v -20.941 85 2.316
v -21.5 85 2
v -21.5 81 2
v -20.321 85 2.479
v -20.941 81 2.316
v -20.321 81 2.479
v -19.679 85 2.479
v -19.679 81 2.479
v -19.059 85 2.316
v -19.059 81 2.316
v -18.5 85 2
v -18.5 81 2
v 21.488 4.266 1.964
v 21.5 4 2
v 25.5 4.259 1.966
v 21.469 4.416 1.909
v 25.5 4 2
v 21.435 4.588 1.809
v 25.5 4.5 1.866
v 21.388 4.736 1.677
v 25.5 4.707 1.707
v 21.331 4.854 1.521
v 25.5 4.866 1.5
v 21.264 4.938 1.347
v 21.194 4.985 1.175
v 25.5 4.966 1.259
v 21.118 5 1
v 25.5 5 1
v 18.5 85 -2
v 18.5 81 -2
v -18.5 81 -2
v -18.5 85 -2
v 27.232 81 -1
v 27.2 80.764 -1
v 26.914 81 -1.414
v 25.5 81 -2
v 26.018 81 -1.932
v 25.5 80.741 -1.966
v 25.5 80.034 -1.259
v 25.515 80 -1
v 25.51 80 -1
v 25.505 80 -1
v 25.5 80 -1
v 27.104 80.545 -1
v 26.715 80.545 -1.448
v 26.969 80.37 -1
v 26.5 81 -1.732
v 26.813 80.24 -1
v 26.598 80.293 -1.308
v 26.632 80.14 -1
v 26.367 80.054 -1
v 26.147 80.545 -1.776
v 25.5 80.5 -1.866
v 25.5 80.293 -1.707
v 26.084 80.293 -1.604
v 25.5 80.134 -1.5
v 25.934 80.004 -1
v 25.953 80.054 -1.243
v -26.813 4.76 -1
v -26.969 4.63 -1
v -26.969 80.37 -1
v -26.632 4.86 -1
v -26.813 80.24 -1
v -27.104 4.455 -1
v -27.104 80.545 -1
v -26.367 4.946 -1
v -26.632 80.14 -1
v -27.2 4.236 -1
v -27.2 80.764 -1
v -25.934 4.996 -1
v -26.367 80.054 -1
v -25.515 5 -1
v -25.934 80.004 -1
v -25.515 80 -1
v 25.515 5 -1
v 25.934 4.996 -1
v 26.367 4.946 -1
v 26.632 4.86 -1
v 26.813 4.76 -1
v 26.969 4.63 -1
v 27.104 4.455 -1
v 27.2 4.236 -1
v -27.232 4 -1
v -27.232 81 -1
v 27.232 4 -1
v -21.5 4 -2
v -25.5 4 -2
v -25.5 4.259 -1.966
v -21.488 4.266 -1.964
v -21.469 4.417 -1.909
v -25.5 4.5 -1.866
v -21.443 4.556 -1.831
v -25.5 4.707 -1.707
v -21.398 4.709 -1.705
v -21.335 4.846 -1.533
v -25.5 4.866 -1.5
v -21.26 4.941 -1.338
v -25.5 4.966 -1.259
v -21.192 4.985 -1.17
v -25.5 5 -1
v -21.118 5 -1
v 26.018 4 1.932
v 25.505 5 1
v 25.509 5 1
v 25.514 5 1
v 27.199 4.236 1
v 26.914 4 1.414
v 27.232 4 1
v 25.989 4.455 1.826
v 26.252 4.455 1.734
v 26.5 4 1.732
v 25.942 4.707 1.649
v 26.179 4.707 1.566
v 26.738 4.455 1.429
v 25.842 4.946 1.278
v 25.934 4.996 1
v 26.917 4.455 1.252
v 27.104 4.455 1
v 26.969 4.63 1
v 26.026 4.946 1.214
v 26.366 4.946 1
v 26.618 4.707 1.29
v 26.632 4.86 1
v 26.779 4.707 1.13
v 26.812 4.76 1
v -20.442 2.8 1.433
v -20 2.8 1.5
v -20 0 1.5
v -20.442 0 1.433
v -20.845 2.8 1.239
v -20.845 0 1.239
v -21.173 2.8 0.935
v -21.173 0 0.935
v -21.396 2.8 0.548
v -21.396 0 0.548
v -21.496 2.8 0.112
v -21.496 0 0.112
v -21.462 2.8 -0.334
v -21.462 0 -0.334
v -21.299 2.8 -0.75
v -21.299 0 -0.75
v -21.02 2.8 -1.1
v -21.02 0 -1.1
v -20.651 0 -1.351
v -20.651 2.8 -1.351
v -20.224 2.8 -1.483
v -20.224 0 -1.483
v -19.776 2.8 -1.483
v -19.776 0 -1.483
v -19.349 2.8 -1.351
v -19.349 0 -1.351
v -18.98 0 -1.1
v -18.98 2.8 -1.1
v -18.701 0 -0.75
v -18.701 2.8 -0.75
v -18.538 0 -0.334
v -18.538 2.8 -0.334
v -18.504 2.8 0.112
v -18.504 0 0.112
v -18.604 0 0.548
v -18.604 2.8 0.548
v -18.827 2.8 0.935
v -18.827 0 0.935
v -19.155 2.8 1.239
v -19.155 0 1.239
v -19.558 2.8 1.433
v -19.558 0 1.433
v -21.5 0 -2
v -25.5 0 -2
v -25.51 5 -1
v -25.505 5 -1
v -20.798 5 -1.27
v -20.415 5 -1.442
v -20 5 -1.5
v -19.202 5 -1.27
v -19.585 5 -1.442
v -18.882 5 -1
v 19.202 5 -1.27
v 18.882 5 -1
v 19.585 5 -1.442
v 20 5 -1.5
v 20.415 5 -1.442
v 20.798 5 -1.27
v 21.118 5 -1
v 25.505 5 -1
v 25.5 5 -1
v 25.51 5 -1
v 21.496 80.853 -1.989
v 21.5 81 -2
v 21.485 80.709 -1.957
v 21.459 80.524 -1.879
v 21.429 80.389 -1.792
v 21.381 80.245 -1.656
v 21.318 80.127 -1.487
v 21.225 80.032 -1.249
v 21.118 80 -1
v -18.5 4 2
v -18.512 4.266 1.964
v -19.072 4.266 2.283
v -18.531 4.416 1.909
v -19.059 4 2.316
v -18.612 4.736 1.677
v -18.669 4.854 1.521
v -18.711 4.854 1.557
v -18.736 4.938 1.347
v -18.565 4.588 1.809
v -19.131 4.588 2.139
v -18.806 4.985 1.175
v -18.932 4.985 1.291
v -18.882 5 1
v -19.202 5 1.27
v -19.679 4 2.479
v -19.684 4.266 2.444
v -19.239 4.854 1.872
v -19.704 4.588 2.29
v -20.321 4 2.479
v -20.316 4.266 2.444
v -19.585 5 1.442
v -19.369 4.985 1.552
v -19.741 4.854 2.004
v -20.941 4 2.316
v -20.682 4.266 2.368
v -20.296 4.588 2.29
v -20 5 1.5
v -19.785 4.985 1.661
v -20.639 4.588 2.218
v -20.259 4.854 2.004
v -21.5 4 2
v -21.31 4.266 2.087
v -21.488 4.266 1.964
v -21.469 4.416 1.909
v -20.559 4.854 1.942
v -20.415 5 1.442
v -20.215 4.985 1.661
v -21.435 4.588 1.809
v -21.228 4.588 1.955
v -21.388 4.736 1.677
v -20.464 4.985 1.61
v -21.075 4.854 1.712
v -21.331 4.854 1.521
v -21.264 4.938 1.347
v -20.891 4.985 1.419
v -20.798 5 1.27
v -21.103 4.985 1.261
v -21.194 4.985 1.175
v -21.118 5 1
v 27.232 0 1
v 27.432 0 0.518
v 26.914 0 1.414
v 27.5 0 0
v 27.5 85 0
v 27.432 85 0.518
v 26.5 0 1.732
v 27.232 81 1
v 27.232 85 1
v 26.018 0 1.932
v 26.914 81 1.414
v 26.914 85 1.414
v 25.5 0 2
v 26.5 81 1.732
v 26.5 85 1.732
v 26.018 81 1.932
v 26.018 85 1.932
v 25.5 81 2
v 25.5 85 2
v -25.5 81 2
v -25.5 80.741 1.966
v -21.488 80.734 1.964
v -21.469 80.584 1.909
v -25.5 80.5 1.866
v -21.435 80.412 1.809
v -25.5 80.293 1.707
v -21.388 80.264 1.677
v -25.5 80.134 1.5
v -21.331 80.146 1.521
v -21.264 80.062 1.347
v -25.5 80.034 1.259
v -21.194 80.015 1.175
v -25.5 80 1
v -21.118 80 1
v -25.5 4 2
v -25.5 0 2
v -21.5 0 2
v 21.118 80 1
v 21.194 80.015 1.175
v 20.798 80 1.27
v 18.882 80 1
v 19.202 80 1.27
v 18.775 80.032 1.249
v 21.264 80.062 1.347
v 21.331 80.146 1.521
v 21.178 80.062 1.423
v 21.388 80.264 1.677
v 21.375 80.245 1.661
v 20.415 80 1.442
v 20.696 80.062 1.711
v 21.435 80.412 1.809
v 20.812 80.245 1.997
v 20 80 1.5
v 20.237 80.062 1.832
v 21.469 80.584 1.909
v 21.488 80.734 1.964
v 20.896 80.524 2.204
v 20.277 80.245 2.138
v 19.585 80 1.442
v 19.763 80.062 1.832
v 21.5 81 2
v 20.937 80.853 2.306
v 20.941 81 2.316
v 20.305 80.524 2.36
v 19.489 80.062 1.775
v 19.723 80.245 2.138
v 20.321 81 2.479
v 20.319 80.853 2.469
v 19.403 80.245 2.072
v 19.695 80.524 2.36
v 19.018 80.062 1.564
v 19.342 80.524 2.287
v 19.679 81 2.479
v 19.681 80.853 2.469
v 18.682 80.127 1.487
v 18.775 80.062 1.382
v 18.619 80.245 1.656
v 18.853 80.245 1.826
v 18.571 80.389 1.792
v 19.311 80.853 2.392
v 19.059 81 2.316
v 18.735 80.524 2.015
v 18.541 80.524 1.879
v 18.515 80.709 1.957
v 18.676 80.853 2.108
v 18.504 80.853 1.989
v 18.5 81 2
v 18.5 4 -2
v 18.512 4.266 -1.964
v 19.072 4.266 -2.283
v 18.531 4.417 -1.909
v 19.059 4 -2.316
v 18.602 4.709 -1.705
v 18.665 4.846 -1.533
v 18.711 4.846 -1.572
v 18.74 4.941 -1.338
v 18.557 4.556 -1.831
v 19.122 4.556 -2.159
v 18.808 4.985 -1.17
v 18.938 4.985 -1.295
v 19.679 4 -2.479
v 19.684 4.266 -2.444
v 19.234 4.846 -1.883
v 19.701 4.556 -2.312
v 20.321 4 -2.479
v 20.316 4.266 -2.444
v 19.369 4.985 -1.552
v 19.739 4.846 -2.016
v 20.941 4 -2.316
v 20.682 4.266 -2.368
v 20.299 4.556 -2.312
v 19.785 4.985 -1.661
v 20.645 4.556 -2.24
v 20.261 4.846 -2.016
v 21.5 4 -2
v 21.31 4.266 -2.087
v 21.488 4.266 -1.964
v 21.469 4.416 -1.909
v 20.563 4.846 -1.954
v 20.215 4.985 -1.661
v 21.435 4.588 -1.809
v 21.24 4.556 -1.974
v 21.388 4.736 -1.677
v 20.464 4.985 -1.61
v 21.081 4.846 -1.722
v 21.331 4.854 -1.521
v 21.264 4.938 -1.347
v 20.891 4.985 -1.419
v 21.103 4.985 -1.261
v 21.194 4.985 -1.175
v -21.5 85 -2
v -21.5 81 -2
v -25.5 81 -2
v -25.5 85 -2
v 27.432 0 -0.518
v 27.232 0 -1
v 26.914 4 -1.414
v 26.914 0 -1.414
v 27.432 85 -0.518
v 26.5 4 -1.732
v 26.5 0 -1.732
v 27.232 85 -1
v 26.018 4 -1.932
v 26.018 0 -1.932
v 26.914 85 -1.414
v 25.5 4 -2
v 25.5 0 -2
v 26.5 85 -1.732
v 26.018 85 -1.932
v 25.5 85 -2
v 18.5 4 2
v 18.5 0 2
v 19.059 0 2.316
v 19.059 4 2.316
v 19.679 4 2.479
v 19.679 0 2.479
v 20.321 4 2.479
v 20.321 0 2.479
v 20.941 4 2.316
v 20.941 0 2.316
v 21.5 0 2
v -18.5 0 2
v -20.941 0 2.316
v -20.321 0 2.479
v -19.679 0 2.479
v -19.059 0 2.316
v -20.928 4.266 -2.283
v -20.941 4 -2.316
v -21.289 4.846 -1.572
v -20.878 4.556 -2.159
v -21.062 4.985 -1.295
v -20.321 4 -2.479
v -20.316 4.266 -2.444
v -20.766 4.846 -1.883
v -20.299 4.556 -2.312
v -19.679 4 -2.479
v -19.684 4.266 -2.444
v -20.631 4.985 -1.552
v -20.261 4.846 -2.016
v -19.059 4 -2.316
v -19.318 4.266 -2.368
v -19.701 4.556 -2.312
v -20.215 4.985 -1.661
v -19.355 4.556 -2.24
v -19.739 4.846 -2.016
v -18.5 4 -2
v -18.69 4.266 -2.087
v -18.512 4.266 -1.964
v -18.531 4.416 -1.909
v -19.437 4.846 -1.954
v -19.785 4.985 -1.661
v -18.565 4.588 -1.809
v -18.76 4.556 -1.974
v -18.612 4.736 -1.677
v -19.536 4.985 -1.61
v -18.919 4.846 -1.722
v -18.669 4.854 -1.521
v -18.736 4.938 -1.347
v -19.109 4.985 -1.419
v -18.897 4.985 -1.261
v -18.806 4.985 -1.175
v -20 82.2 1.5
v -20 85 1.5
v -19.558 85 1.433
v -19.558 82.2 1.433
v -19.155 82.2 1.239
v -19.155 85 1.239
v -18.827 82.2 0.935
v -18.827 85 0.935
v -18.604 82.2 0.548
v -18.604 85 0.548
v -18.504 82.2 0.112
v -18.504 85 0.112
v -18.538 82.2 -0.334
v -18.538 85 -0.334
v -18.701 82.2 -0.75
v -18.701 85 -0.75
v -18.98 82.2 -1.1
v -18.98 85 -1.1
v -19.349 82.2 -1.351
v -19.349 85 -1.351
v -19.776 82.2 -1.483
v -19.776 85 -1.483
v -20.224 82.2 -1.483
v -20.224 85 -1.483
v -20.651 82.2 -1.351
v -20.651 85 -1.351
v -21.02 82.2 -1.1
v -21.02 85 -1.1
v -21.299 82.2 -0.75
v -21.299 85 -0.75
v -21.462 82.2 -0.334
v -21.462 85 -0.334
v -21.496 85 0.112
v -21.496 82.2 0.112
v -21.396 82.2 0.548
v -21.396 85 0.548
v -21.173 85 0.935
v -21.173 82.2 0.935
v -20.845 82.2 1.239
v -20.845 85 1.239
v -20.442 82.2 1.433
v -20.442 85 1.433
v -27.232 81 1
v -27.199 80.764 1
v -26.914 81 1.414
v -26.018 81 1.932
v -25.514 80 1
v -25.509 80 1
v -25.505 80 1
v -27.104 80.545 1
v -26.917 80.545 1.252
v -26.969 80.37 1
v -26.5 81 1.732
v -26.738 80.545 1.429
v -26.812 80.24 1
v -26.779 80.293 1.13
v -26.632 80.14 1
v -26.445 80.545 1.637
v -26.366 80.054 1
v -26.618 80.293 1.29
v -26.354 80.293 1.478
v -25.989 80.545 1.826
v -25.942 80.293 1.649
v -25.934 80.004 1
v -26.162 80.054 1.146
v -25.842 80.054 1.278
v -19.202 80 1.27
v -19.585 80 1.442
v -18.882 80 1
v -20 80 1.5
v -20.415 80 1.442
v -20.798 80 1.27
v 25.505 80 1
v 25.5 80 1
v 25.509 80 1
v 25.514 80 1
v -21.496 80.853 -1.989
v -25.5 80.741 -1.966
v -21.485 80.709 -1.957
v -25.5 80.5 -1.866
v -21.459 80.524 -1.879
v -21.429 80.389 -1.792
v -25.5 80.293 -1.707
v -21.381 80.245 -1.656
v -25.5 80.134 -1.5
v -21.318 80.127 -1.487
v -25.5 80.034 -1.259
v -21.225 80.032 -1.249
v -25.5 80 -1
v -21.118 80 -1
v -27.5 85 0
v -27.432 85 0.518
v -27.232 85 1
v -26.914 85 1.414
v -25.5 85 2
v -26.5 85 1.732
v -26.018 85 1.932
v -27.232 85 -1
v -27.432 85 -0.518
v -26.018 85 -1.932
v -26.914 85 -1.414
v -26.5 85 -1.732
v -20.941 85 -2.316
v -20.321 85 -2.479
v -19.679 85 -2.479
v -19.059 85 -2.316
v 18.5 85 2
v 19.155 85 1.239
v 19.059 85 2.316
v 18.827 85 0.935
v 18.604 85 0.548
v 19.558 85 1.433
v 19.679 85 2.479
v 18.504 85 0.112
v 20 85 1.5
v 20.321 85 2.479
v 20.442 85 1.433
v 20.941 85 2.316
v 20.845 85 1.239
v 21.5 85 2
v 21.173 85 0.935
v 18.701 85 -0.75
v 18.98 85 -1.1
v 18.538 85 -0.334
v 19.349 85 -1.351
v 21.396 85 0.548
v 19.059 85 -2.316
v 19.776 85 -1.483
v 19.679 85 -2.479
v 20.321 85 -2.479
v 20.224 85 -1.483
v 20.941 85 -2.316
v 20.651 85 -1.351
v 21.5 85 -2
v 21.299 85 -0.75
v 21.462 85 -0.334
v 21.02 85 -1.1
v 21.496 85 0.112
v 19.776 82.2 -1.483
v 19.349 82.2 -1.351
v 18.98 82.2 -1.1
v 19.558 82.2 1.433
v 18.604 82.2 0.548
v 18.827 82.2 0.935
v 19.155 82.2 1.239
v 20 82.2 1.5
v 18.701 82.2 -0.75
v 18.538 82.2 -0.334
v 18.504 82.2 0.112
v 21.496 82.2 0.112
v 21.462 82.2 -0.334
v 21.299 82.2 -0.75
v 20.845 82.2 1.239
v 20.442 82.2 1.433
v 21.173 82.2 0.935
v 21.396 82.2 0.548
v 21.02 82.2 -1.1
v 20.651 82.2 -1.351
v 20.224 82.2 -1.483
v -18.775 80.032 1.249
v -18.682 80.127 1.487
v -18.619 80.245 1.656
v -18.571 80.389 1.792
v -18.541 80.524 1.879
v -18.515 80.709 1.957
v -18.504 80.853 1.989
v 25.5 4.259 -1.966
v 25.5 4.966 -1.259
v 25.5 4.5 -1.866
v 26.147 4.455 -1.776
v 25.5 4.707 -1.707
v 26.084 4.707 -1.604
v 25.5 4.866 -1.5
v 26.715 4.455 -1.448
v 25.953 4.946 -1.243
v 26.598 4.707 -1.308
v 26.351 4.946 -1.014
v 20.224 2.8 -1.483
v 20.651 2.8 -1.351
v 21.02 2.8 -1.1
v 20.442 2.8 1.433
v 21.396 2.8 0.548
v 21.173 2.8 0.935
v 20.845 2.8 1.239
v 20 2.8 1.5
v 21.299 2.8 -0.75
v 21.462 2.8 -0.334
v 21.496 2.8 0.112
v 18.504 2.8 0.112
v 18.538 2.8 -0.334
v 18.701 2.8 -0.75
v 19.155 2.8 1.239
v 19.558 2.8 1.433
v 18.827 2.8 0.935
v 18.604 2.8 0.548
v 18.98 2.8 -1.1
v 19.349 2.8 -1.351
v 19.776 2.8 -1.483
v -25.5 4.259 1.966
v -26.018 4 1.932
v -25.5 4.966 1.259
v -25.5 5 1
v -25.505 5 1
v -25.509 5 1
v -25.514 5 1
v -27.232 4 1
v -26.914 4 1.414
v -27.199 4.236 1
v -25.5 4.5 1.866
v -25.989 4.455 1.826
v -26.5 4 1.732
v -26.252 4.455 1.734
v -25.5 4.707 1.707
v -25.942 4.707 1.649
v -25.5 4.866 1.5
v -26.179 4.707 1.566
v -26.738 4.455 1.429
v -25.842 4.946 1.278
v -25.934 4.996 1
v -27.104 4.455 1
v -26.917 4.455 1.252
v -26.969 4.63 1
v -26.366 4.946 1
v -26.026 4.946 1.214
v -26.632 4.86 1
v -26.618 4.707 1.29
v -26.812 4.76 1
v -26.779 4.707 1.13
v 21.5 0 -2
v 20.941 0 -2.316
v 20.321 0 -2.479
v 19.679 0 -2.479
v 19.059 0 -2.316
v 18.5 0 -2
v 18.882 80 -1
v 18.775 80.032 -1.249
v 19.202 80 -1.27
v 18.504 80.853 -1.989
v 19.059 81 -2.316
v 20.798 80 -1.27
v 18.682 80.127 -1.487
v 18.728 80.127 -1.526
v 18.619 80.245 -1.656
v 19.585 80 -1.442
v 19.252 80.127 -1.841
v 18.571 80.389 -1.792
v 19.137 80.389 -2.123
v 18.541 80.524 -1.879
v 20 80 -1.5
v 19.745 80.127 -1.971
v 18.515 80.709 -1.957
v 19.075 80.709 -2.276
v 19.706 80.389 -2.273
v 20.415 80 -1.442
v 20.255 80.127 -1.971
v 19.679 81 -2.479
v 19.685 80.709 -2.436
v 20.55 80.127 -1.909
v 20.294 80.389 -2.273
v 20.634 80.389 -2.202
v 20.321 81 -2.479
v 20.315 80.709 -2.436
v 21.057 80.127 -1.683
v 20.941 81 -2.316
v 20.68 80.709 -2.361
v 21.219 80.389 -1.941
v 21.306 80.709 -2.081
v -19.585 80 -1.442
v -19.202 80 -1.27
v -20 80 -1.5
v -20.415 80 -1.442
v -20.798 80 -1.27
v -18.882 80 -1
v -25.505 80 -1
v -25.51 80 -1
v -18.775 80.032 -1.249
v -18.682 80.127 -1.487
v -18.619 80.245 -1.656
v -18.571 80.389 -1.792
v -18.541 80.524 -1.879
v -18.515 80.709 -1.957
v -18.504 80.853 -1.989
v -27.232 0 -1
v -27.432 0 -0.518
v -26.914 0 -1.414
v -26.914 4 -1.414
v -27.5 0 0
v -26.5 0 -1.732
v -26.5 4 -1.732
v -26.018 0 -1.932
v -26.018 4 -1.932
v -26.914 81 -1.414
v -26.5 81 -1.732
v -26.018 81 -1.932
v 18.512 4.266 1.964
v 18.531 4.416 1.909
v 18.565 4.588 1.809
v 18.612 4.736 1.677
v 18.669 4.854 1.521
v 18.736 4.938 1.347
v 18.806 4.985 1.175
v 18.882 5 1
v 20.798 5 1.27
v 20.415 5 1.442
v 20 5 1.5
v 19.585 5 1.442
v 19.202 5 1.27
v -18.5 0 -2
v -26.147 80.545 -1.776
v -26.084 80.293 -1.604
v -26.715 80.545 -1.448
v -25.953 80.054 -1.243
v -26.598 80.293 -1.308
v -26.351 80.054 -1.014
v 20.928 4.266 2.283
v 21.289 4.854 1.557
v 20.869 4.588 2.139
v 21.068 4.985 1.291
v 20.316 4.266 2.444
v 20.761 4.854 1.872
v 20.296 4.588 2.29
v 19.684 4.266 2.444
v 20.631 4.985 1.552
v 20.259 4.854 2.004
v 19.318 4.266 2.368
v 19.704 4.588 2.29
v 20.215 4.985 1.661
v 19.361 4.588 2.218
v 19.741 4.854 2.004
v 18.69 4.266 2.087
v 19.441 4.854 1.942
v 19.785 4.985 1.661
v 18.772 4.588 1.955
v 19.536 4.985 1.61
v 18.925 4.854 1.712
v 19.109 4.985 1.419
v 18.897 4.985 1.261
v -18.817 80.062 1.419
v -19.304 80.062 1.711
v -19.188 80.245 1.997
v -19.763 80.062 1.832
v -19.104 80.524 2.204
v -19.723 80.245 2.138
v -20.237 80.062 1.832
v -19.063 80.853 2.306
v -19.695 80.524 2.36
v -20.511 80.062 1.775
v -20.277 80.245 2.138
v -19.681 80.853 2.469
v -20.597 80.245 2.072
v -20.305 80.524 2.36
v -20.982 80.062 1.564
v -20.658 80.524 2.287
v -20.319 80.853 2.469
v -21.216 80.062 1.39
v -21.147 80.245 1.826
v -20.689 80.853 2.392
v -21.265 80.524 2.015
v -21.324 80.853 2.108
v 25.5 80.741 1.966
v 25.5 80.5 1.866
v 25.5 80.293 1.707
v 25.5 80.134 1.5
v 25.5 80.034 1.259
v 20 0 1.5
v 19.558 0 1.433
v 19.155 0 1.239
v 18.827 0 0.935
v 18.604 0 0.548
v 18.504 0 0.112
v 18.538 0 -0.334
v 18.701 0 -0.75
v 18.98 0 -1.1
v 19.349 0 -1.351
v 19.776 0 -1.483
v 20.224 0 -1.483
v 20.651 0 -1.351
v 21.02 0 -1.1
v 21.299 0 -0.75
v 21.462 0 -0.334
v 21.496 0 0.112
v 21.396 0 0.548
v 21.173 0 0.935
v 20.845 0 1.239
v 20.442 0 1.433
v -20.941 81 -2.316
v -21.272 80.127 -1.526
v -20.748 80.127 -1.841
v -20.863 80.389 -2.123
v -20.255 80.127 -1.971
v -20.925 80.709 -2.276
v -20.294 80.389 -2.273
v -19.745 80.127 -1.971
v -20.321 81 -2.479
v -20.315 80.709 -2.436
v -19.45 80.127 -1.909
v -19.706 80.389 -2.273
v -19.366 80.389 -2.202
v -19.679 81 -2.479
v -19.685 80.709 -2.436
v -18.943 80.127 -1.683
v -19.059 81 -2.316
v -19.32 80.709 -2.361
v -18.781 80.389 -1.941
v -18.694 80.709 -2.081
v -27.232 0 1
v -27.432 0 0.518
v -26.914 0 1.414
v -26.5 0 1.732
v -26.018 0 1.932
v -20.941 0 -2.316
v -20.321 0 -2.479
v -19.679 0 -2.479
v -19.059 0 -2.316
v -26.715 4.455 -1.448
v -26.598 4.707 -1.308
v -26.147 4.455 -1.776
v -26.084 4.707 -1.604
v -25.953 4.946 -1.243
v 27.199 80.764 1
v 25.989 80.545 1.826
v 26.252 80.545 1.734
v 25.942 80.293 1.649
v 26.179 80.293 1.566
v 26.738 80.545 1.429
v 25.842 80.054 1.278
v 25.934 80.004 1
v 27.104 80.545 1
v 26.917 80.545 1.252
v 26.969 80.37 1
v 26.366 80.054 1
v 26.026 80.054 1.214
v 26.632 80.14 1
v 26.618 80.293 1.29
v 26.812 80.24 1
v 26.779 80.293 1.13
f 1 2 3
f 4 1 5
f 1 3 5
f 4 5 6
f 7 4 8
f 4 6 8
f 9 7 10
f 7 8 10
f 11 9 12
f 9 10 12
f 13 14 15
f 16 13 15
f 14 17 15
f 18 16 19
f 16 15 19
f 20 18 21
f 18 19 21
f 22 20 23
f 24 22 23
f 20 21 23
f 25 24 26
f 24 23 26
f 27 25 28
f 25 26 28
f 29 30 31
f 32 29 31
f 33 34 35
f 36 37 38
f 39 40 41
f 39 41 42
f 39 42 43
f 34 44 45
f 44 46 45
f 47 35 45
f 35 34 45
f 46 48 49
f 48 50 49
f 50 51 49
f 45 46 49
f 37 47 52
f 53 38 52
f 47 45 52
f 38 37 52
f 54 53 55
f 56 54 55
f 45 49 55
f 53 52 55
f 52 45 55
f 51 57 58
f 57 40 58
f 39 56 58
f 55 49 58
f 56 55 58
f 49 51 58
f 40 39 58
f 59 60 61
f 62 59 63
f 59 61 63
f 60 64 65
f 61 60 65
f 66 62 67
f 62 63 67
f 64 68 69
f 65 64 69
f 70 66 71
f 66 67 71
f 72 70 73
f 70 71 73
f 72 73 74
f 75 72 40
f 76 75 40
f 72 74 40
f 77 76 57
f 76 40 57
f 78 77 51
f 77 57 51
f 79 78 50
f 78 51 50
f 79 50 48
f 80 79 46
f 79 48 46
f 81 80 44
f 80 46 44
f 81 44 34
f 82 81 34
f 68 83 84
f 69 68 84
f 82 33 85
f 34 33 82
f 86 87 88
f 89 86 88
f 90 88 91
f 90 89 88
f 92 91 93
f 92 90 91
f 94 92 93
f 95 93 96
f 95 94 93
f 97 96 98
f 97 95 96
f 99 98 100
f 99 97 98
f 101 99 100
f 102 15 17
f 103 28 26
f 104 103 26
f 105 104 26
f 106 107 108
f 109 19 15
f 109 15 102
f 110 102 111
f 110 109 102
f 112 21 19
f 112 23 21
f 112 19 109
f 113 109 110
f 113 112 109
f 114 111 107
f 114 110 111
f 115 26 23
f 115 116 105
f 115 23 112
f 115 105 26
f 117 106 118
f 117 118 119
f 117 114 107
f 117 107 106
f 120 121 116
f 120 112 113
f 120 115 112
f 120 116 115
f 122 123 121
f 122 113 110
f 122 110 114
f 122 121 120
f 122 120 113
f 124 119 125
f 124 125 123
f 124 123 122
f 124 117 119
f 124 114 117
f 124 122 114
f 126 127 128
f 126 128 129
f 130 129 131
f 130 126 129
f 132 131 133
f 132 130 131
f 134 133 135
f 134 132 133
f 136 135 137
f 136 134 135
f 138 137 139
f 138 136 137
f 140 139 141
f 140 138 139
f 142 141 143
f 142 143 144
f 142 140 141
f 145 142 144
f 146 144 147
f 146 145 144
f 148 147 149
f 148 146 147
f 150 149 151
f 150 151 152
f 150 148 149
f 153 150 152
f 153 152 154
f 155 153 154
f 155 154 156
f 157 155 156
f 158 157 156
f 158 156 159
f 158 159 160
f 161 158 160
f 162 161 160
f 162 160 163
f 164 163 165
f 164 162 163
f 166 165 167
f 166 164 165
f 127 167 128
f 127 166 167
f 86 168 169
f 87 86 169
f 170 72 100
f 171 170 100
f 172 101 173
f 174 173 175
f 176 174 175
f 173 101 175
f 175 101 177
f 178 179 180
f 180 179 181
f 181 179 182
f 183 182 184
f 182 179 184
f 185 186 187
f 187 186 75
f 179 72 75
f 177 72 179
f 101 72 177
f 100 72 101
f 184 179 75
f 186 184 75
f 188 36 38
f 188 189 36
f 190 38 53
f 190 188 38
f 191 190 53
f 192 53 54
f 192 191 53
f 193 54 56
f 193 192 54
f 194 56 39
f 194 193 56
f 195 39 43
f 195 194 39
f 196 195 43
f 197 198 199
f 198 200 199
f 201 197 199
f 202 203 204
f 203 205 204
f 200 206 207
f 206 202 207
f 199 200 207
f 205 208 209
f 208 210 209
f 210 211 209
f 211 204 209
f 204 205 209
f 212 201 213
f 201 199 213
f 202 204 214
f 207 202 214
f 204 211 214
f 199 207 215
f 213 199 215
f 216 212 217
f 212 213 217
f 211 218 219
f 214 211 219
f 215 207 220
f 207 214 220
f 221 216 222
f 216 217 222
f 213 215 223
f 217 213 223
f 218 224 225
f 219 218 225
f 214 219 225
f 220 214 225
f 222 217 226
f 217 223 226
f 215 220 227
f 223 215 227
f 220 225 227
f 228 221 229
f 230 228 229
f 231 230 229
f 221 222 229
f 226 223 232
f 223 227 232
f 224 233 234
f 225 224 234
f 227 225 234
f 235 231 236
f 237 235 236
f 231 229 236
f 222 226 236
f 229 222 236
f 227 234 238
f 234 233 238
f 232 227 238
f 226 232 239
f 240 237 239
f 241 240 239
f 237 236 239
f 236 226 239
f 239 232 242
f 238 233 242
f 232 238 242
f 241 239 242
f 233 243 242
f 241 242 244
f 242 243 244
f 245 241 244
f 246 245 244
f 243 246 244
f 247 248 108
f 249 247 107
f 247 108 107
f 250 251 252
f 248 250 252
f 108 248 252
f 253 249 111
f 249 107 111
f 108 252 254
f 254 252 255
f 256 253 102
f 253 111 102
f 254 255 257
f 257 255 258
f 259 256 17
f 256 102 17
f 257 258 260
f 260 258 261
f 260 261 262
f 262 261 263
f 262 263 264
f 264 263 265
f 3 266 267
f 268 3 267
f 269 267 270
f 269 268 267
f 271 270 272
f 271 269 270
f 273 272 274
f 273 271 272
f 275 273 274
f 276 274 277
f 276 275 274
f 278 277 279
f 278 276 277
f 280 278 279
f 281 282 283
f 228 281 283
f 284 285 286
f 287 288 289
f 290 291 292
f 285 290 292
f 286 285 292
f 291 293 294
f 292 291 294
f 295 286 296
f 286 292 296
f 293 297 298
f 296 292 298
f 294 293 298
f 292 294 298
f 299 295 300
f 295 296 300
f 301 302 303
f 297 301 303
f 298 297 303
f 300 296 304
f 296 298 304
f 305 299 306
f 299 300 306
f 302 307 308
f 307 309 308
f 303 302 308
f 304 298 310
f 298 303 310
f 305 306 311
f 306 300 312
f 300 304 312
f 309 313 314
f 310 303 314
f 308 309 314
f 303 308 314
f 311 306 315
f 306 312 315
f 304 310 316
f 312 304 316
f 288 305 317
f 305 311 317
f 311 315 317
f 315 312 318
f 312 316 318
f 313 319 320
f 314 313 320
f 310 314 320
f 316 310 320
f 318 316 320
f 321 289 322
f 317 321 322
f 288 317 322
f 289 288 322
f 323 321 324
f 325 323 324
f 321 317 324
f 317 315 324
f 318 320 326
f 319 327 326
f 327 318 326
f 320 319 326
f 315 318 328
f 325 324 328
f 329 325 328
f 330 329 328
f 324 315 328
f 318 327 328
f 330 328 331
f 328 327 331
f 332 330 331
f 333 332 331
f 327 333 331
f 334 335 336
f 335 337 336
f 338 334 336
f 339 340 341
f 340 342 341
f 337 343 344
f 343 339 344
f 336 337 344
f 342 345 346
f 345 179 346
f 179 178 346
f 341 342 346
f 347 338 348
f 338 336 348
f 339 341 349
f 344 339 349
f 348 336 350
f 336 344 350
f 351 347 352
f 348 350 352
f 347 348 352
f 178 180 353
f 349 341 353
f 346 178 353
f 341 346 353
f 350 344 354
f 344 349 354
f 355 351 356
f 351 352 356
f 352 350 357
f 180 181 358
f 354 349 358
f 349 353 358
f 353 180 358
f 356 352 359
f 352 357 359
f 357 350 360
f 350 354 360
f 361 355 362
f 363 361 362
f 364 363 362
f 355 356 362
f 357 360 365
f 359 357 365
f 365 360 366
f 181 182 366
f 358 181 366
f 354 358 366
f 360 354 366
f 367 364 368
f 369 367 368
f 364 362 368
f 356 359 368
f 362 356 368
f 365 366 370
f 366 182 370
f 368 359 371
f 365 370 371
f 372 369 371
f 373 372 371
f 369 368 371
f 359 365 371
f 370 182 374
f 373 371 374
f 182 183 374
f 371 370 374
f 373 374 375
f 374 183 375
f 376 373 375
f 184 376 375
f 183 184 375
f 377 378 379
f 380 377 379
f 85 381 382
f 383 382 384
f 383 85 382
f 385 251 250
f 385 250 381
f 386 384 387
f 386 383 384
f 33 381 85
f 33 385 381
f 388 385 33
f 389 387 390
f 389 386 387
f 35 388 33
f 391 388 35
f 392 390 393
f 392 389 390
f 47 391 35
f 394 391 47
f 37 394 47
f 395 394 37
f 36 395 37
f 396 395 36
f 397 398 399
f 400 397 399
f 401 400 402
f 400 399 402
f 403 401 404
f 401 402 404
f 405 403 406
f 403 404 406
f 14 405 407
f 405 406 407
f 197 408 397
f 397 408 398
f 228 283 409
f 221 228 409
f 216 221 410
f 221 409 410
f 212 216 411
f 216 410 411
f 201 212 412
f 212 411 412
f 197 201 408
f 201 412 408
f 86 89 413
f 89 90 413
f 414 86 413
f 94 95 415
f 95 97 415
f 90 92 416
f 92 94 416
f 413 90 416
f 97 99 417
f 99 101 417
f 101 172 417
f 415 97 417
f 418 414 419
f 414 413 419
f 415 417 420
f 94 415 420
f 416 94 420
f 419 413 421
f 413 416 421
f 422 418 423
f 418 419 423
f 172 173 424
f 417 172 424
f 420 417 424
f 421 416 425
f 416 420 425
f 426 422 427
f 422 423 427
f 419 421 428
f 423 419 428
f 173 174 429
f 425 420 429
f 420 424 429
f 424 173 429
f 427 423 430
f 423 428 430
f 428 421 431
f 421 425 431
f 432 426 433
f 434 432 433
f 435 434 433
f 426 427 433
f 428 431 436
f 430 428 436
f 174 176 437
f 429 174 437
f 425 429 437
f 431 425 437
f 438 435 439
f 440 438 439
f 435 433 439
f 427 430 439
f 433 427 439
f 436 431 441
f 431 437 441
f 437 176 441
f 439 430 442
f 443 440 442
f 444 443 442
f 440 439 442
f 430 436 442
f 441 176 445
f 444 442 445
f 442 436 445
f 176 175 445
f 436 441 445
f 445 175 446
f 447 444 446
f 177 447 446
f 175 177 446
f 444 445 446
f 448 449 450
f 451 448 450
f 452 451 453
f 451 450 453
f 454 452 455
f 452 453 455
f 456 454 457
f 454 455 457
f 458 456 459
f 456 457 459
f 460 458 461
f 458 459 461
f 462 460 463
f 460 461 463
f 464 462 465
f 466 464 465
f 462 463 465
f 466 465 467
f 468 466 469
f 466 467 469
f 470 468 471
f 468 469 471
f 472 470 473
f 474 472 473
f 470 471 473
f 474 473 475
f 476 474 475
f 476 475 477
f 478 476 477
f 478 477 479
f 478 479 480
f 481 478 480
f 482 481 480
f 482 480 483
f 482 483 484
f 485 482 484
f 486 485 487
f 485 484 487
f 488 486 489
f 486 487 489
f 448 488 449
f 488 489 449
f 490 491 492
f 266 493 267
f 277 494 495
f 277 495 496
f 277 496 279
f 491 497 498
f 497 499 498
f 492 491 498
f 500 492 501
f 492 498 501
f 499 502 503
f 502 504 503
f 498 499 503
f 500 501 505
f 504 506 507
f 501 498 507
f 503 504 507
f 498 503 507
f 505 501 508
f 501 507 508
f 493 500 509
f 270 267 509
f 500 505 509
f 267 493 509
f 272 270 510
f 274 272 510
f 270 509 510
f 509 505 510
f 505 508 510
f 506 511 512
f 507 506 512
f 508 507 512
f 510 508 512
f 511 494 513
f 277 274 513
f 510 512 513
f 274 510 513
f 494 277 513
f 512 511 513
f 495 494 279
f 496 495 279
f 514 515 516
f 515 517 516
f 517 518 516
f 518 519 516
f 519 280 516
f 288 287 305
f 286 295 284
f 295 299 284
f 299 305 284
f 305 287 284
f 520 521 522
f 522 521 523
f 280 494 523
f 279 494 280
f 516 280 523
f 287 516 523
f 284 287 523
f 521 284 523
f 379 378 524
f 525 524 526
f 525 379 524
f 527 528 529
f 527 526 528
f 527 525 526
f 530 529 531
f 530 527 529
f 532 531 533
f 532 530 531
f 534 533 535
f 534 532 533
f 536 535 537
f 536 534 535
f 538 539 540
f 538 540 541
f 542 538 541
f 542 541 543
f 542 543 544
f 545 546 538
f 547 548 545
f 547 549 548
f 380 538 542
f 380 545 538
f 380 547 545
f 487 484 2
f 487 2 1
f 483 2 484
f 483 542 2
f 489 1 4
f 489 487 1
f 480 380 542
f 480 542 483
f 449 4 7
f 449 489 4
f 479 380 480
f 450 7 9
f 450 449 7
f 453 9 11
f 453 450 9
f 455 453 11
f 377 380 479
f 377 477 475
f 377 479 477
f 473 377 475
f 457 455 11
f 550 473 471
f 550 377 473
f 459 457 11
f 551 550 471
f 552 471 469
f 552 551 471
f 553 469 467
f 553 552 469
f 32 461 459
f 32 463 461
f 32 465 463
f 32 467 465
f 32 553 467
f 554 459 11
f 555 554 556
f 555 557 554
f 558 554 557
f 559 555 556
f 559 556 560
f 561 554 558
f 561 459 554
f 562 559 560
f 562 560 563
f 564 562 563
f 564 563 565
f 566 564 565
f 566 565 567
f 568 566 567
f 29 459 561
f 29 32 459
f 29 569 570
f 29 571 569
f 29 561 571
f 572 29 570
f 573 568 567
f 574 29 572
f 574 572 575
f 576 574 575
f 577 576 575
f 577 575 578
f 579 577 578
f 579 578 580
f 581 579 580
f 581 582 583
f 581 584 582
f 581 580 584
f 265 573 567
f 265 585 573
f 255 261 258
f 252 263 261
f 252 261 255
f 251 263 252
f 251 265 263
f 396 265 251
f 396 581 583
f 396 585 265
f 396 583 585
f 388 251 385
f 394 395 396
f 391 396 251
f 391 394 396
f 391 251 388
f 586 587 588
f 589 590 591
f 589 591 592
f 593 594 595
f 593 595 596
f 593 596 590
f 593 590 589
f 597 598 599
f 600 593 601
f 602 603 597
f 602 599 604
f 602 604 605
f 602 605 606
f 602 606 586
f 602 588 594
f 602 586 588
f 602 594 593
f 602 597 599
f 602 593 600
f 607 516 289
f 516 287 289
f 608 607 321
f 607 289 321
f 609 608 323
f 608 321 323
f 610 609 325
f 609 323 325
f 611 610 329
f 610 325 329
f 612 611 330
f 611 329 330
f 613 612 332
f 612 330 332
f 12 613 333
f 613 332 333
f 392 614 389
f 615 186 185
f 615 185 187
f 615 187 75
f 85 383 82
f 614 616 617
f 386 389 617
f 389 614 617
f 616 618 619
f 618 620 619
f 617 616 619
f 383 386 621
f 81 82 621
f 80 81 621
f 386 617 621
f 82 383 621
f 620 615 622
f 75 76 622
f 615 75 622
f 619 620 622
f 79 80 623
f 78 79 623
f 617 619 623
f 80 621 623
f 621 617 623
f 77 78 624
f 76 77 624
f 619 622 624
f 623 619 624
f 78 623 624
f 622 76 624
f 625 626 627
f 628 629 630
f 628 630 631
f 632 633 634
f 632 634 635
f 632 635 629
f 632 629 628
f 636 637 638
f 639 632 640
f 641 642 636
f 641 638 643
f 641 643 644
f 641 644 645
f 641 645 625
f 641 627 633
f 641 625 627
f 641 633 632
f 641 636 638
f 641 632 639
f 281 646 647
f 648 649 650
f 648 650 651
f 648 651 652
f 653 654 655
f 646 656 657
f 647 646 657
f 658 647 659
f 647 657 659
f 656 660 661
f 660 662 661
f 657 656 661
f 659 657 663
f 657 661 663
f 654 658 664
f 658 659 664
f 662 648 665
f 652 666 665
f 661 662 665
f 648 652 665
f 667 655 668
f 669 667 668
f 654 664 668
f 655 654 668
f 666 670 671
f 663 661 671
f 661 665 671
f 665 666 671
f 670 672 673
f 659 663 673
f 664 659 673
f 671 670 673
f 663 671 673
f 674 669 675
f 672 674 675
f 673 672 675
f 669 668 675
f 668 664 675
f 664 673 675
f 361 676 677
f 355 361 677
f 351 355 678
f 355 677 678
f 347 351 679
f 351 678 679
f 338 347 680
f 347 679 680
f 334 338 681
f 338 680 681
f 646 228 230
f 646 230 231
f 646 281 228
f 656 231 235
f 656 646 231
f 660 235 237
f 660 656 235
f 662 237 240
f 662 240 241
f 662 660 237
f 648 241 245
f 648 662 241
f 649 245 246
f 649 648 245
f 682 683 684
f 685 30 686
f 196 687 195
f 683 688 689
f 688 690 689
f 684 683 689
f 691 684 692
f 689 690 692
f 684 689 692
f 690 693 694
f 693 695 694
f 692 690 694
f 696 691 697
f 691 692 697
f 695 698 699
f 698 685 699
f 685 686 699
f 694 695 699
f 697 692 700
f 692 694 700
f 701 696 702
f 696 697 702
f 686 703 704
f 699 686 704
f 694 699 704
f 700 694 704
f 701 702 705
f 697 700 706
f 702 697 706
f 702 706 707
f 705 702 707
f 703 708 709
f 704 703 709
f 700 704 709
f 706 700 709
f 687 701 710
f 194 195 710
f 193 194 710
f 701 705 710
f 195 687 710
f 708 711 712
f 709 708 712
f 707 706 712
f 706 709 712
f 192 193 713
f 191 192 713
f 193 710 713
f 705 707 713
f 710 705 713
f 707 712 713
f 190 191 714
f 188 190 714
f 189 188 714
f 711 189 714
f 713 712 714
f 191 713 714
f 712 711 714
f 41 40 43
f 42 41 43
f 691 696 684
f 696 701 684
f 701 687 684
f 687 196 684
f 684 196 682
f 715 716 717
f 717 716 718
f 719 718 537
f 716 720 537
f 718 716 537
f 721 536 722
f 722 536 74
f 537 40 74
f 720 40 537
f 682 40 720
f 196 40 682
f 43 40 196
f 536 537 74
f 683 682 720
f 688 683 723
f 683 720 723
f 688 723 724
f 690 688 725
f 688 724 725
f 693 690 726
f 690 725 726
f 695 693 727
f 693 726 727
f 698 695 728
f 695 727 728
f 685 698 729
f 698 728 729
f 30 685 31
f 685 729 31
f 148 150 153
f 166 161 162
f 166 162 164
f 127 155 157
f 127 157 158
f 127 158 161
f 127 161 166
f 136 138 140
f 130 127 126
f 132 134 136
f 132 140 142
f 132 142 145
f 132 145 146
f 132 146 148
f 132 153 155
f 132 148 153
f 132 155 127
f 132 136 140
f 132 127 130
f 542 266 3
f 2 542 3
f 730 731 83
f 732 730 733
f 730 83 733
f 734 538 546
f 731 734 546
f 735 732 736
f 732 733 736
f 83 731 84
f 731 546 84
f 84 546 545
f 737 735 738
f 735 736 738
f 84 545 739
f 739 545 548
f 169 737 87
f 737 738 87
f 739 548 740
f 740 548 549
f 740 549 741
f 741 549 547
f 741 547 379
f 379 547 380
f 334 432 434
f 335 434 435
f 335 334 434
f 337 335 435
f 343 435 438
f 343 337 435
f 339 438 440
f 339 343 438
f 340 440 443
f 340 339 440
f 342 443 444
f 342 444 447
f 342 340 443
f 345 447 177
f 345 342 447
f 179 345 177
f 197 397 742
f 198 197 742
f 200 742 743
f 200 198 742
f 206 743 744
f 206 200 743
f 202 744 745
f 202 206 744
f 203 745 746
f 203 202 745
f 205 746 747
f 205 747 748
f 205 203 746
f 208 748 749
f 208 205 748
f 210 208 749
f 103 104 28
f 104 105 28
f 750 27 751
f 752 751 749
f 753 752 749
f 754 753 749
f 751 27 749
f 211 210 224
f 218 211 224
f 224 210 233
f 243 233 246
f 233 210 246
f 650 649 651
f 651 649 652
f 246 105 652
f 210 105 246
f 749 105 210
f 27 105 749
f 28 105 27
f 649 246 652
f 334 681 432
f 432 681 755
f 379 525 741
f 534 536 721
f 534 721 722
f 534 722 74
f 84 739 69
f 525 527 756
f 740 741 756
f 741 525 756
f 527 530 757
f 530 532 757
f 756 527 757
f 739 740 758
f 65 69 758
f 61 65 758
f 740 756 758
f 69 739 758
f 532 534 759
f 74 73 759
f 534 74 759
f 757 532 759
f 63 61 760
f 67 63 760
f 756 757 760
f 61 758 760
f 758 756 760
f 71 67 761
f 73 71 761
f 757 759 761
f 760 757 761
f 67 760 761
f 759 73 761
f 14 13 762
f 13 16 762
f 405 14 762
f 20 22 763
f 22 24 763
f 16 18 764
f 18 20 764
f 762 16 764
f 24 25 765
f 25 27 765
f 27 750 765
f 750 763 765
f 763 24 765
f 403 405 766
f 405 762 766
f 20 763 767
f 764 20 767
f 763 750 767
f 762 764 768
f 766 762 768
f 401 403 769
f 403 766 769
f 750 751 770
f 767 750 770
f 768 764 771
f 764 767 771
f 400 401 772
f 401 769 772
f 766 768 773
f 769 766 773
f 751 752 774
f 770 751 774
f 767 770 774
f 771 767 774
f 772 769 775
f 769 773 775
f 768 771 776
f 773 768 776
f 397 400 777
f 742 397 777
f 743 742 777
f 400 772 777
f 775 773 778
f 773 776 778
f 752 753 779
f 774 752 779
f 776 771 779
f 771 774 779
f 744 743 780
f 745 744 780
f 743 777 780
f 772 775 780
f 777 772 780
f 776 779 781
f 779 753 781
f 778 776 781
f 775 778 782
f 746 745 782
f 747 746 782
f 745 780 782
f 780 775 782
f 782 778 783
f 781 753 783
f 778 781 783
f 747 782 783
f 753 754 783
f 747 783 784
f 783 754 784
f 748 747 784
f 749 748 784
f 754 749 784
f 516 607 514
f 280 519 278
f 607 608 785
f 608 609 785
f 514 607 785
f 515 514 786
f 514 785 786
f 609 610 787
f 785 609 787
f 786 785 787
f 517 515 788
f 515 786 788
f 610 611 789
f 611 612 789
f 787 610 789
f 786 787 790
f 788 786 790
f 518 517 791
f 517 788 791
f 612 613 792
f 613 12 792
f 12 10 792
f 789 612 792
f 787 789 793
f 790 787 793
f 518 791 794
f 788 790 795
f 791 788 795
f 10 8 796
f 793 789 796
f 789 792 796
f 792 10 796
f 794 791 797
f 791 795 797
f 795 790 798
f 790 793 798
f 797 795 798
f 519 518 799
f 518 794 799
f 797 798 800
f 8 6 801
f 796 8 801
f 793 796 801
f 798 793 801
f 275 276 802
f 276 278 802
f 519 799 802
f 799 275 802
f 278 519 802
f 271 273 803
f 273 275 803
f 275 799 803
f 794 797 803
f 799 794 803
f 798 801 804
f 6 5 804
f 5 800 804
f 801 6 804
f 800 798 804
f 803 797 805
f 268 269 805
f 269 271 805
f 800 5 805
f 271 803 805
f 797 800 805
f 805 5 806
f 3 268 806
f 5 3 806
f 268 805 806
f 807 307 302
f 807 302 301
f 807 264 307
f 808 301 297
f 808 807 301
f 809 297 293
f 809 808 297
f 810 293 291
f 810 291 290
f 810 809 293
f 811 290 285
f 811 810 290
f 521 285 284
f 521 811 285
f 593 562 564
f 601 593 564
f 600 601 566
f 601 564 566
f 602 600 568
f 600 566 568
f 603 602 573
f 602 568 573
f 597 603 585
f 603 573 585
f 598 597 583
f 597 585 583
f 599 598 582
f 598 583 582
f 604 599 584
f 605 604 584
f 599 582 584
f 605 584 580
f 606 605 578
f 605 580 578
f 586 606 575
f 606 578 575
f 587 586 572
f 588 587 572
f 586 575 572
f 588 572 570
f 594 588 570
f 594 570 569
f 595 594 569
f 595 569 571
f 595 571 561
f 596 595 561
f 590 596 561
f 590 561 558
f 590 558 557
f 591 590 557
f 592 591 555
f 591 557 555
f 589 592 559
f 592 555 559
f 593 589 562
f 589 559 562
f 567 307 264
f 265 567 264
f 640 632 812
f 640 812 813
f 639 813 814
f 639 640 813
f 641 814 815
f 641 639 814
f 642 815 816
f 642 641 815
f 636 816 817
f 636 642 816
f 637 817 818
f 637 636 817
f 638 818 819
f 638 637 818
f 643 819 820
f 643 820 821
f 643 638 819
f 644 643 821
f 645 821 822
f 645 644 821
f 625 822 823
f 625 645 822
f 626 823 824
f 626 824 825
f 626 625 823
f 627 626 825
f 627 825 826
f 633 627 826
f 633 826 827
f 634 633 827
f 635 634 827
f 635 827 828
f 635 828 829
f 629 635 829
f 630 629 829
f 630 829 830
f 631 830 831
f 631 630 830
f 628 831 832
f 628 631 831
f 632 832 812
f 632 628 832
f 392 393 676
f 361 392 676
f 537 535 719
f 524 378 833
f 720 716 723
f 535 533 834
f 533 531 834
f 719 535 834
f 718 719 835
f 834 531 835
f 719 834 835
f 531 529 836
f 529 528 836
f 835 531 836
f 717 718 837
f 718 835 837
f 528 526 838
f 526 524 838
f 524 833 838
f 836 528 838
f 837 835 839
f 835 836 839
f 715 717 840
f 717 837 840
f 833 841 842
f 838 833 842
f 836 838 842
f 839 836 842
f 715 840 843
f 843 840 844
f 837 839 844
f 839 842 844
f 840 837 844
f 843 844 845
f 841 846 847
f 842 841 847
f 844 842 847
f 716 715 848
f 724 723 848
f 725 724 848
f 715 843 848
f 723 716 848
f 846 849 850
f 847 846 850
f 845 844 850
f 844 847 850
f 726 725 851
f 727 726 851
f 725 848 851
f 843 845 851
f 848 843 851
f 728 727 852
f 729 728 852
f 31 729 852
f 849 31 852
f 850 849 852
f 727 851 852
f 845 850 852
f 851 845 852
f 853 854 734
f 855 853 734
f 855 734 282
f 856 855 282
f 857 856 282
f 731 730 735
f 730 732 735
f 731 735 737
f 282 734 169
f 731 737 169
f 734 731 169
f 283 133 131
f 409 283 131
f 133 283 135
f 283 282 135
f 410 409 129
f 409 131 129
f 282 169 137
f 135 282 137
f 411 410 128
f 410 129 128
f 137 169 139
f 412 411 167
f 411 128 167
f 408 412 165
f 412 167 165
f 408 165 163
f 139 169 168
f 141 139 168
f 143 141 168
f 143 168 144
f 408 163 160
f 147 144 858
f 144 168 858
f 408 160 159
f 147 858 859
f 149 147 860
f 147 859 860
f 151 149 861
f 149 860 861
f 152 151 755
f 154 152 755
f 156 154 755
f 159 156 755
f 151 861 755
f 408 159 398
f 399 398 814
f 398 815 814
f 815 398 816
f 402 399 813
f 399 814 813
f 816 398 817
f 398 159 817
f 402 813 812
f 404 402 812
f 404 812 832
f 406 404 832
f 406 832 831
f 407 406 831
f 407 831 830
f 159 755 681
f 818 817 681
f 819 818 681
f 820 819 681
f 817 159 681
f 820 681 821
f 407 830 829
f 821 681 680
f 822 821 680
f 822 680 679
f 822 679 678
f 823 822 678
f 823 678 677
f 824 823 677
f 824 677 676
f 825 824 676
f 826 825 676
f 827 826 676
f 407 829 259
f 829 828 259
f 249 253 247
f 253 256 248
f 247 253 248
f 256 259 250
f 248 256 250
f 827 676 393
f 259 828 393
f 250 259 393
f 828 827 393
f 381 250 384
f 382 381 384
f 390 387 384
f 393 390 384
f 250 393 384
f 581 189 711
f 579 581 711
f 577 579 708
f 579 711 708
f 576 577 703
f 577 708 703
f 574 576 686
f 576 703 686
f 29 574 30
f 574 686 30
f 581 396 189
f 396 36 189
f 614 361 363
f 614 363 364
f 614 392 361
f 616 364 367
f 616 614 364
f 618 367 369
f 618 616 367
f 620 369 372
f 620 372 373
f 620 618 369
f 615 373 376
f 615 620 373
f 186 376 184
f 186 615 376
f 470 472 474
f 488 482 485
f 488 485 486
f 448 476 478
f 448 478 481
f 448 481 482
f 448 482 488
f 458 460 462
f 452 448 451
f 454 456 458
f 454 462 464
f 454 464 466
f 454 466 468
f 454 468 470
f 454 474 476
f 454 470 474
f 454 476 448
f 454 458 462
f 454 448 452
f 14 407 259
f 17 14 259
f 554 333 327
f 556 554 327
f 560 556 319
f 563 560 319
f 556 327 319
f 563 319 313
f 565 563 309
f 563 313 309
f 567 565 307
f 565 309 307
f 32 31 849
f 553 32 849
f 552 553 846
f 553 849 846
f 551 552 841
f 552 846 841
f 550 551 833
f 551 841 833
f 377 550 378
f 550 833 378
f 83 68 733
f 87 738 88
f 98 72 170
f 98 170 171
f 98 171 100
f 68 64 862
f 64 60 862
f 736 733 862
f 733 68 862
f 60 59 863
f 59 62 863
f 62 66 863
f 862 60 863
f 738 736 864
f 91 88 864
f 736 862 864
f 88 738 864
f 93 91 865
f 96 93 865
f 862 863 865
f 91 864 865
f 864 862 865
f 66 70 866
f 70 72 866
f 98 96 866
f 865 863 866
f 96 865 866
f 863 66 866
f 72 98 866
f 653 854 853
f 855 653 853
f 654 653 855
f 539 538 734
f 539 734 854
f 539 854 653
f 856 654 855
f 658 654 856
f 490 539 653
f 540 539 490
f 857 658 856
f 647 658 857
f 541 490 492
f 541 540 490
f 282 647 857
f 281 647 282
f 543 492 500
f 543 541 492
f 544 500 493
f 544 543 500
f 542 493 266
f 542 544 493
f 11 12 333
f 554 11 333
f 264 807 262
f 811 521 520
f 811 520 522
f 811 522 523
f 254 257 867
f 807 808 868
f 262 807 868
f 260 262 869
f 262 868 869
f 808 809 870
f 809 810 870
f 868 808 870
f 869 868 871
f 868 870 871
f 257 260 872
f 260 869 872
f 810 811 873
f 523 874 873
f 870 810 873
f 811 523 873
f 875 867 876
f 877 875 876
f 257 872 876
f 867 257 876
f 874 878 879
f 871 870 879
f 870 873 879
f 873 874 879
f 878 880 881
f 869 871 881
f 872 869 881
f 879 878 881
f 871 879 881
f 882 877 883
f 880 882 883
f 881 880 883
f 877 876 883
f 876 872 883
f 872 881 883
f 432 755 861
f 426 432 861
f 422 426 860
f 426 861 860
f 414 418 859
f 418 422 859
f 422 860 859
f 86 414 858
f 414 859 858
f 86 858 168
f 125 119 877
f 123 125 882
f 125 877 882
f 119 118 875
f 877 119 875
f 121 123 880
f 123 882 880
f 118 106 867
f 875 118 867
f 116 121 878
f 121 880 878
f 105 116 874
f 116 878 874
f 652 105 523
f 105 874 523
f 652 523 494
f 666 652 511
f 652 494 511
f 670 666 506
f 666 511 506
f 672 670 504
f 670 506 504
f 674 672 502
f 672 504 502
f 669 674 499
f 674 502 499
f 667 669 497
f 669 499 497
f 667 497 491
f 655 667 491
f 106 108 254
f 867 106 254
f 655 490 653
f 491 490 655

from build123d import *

# Parameters (mm, degrees)
BOSS_EXTRUDE1_DEPTH     = 85
SKETCH2_R               = 1.5000000000000007
CUT_EXTRUDE1_DEPTH      = 2.8
CUT_EXTRUDE2_START      = -2.8
SKETCH3_R               = 1.5000000000000007
CUT_EXTRUDE2_DEPTH      = 2.8
CUT_EXTRUDE3_DEPTH      = 5
CUT_EXTRUDE3_DEPTH_BACK = 1
CUT_EXTRUDE4_DEPTH      = 1
CUT_EXTRUDE4_DEPTH_BACK = 1
FILLET1_R               = 2
FILLET2_R               = 1


with BuildPart() as part:
    # Sketch1 → Boss-Extrude1 (new body)
    with BuildSketch(Plane(origin=(0, 0, 0), x_dir=(1, 0, 0), z_dir=(0, 1, 0))):
        with BuildLine():
            Line((-18.500000000000032, 1.9999999999999996), (-21.500000000000068, 1.9999999999999996))
            ThreePointArc((-21.500000000000053, 1.9999999999999463), (-22.499999999999986, -1.91e-15), (-21.50000000000005, -1.9999999999999476))
            Line((-21.500000000000064, -2.0000000000000004), (-18.500000000000036, -2.0000000000000004))
            ThreePointArc((-18.50000000000003, -2.0000000000000226), (-17.763932022500214, -1.1180339887499129), (-17.499999999999993, -6.1e-16))
            ThreePointArc((-17.499999999999993, 0), (-17.763932022500214, 1.1180339887499113), (-18.500000000000025, 2.0000000000000213))
        make_face()
        with BuildLine():
            ThreePointArc((-18.500000000000025, 2.000000000000021), (-20.00000000000005, 2.4999999999999947), (-21.500000000000053, 1.9999999999999463))
            Line((-21.500000000000068, 1.9999999999999996), (-18.500000000000032, 1.9999999999999996))
        make_face()
        with BuildLine():
            Line((-18.500000000000036, -2.0000000000000004), (-21.500000000000064, -2.0000000000000004))
            ThreePointArc((-21.50000000000005, -1.9999999999999476), (-20.000000000000053, -2.4999999999999947), (-18.50000000000003, -2.0000000000000226))
        make_face()
        with BuildLine():
            Line((-21.500000000000068, 1.9999999999999996), (-27.49999999999999, 1.9999999999999996))
            Line((-27.49999999999999, 1.9999999999999996), (-27.49999999999999, -2.0000000000000004))
            Line((-27.49999999999999, -2.0000000000000004), (-21.500000000000064, -2.0000000000000004))
            ThreePointArc((-21.50000000000005, -1.9999999999999476), (-22.499999999999986, -1.91e-15), (-21.500000000000053, 1.9999999999999463))
        make_face()
        with BuildLine():
            Line((18.49999999999991, 1.9999999999999996), (-18.500000000000032, 1.9999999999999996))
            ThreePointArc((-18.500000000000025, 2.0000000000000213), (-17.763932022500214, 1.1180339887499113), (-17.499999999999993, 0))
            ThreePointArc((-17.499999999999993, -6.1e-16), (-17.763932022500214, -1.1180339887499129), (-18.50000000000003, -2.0000000000000226))
            Line((-18.500000000000036, -2.0000000000000004), (18.499999999999925, -2.0000000000000004))
            ThreePointArc((18.499999999999932, -1.9999999999999478), (17.5, -1.91e-15), (18.49999999999993, 1.9999999999999456))
        make_face()
        with BuildLine():
            ThreePointArc((21.49999999999997, 2.00000000000002), (19.99999999999994, 2.4999999999999982), (18.49999999999993, 1.9999999999999456))
            Line((18.49999999999991, 1.9999999999999996), (21.499999999999968, 1.9999999999999996))
        make_face()
        with BuildLine():
            Line((21.499999999999968, 1.9999999999999996), (18.49999999999991, 1.9999999999999996))
            ThreePointArc((18.49999999999993, 1.9999999999999456), (17.5, -1.91e-15), (18.499999999999932, -1.9999999999999478))
            Line((18.49999999999992, -2.0000000000000004), (21.499999999999954, -2.0000000000000004))
            ThreePointArc((21.499999999999964, -2.0000000000000244), (22.23606797749978, -1.1180339887499124), (22.5, -6.1e-16))
            ThreePointArc((22.5, 0), (22.23606797749978, 1.11803398874991), (21.49999999999997, 2.00000000000002))
        make_face()
        with BuildLine():
            Line((21.499999999999954, -2.0000000000000004), (18.49999999999992, -2.0000000000000004))
            ThreePointArc((18.499999999999932, -1.9999999999999478), (19.999999999999936, -2.4999999999999982), (21.499999999999964, -2.0000000000000244))
        make_face()
        with BuildLine():
            Line((27.50000000000001, 1.9999999999999996), (21.499999999999968, 1.9999999999999996))
            ThreePointArc((21.49999999999997, 2.00000000000002), (22.23606797749978, 1.11803398874991), (22.5, 0))
            ThreePointArc((22.5, -6.1e-16), (22.23606797749978, -1.1180339887499124), (21.499999999999964, -2.0000000000000244))
            Line((21.499999999999954, -2.0000000000000004), (27.50000000000001, -2.0000000000000004))
            Line((27.50000000000001, -2.0000000000000004), (27.50000000000001, 1.9999999999999996))
        make_face()
    extrude(amount=BOSS_EXTRUDE1_DEPTH)

    # Sketch2 → Cut-Extrude1 (cut)
    with BuildSketch(Plane(origin=(0, 85, 0), x_dir=(1, 0, 0), z_dir=(0, 1, 0))):
        with Locations(Location((-19.99999999999999, 0, 0), (0, 0, 270))):
            Circle(SKETCH2_R)
        with Locations(Location((20, 0, 0), (0, 0, 270))):
            Circle(SKETCH2_R)
    extrude(amount=-CUT_EXTRUDE1_DEPTH, mode=Mode.SUBTRACT)

    # Sketch3 → Cut-Extrude2 (cut)
    with BuildSketch(Plane.XZ.offset(CUT_EXTRUDE2_START)):
        with Locations(Location((-19.99999999999999, 0, 0), (0, 0, 90))):
            Circle(SKETCH3_R)
        with Locations(Location((20, 0, 0), (0, 0, 90))):
            Circle(SKETCH3_R)
    extrude(amount=CUT_EXTRUDE2_DEPTH, mode=Mode.SUBTRACT)

    # Sketch4 → Cut-Extrude3 (cut, two sides: drawn at the far end of the back side and taken through both)
    with BuildSketch(Plane.XY.offset(2.0000000000000004).offset(-CUT_EXTRUDE3_DEPTH_BACK)):
        Polygon((-27.500000000000018, 80), (27.500000000000007, 80), (27.50000000000001, 4.999999999999997), (-27.50000000000001, 4.999999999999997), align=None)
    extrude(amount=CUT_EXTRUDE3_DEPTH + CUT_EXTRUDE3_DEPTH_BACK, mode=Mode.SUBTRACT)

    # Sketch5 → Cut-Extrude4 (cut, two sides: drawn at the far end of the back side and taken through both)
    with BuildSketch(Plane(origin=(0, 0, -1.9999999999999996), x_dir=(-1, 0, 0), z_dir=(0, 0, -1)).offset(-CUT_EXTRUDE4_DEPTH_BACK)):
        Polygon((-27.49999999999999, 80.00000000000001), (27.49999999999999, 80.00000000000001), (27.49999999999999, 5.0000000000000115), (-27.499999999999982, 5.0000000000000115), align=None)
    extrude(amount=CUT_EXTRUDE4_DEPTH + CUT_EXTRUDE4_DEPTH_BACK, mode=Mode.SUBTRACT)

    # Fillet1
    fillet1_edges = [part.edges().sort_by_distance(p)[0] for p in [
        (-27.49999999999999, 82.5, 2.0000000000000004),
    ]]
    fillet(fillet1_edges, radius=FILLET1_R)
    fillet1_2_edges = [part.edges().sort_by_distance(p)[0] for p in [
        (-27.49999999999999, 2.5000000000000058, -1.9999999999999996),
    ]]
    fillet(fillet1_2_edges, radius=FILLET1_R - 0.0004)  # a hair under: the kernel refuses the full size
    fillet1_3_edges = [part.edges().sort_by_distance(p)[0] for p in [
        (27.50000000000001, 82.5, 2.0000000000000004),
    ]]
    fillet(fillet1_3_edges, radius=FILLET1_R)
    fillet1_4_edges = [part.edges().sort_by_distance(p)[0] for p in [
        (27.50000000000001, 2.5000000000000058, -1.9999999999999996),
    ]]
    fillet(fillet1_4_edges, radius=FILLET1_R - 0.0004)  # a hair under: the kernel refuses the full size

    # Fillet2
    fillet2_edges = [part.edges().sort_by_distance(p)[0] for p in [
        (-19.999999999999986, 80.00000000000001, -2.499999999999992),
        (19.999999999999996, 80.00000000000001, -2.500000000000009),
        (19.999999999999996, 5.0000000000000115, -2.500000000000009),
        (-19.999999999999986, 5.0000000000000115, -2.499999999999992),
        (-5.684e-14, 80.00000000000001, -1.9999999999999996),
        (23.50019999999999, 5.0000000000000115, -1.9999999999999996),
        (-5.329e-14, 5.0000000000000115, -1.9999999999999996),
        (23.500200169244646, 80.00000000000001, -1.9999999999999996),
        (-26.5002999949995, 80.00000000000001, -1.7320466614179624),
        (26.50030014156478, 80.00000000000001, -1.7320465767871778),
        (-23.500200000000024, 5.0000000000000115, -1.9999999999999996),
        (-26.500299994999484, 5.0000000000000115, -1.7320466614179728),
        (26.500299994999494, 5.0000000000000115, -1.7320466614179786),
        (-23.500000000000025, 4.999999999999997, 2.0000000000000004),
        (-26.49999999999999, 5, 1.7320508075688776),
        (26.500000103238282, 5, 1.7320507479642298),
        (23.499999999999982, 80, 2.0000000000000004),
        (-26.499999999999982, 80, 1.7320508075688823),
        (26.50000000000001, 80, 1.732050807568878),
        (-20.000000000000053, 80, 2.4999999999999925),
        (-23.50000000000002, 80, 2.0000000000000004),
        (19.999999999999932, 80, 2.499999999999999),
        (-5.329e-14, 80, 2.0000000000000004),
        (-20.000000000000053, 4.999999999999997, 2.4999999999999925),
        (-5.507e-14, 4.999999999999997, 2.0000000000000004),
        (19.999999999999932, 4.999999999999997, 2.499999999999999),
        (23.500000119209272, 4.999999999999997, 2.0000000000000004),
        (-23.500200000000024, 80.00000000000001, -1.9999999999999996),
    ]]
    fillet(fillet2_edges, radius=FILLET2_R - 0.0001)  # a hair under: the kernel refuses the full size


solid = part.part
